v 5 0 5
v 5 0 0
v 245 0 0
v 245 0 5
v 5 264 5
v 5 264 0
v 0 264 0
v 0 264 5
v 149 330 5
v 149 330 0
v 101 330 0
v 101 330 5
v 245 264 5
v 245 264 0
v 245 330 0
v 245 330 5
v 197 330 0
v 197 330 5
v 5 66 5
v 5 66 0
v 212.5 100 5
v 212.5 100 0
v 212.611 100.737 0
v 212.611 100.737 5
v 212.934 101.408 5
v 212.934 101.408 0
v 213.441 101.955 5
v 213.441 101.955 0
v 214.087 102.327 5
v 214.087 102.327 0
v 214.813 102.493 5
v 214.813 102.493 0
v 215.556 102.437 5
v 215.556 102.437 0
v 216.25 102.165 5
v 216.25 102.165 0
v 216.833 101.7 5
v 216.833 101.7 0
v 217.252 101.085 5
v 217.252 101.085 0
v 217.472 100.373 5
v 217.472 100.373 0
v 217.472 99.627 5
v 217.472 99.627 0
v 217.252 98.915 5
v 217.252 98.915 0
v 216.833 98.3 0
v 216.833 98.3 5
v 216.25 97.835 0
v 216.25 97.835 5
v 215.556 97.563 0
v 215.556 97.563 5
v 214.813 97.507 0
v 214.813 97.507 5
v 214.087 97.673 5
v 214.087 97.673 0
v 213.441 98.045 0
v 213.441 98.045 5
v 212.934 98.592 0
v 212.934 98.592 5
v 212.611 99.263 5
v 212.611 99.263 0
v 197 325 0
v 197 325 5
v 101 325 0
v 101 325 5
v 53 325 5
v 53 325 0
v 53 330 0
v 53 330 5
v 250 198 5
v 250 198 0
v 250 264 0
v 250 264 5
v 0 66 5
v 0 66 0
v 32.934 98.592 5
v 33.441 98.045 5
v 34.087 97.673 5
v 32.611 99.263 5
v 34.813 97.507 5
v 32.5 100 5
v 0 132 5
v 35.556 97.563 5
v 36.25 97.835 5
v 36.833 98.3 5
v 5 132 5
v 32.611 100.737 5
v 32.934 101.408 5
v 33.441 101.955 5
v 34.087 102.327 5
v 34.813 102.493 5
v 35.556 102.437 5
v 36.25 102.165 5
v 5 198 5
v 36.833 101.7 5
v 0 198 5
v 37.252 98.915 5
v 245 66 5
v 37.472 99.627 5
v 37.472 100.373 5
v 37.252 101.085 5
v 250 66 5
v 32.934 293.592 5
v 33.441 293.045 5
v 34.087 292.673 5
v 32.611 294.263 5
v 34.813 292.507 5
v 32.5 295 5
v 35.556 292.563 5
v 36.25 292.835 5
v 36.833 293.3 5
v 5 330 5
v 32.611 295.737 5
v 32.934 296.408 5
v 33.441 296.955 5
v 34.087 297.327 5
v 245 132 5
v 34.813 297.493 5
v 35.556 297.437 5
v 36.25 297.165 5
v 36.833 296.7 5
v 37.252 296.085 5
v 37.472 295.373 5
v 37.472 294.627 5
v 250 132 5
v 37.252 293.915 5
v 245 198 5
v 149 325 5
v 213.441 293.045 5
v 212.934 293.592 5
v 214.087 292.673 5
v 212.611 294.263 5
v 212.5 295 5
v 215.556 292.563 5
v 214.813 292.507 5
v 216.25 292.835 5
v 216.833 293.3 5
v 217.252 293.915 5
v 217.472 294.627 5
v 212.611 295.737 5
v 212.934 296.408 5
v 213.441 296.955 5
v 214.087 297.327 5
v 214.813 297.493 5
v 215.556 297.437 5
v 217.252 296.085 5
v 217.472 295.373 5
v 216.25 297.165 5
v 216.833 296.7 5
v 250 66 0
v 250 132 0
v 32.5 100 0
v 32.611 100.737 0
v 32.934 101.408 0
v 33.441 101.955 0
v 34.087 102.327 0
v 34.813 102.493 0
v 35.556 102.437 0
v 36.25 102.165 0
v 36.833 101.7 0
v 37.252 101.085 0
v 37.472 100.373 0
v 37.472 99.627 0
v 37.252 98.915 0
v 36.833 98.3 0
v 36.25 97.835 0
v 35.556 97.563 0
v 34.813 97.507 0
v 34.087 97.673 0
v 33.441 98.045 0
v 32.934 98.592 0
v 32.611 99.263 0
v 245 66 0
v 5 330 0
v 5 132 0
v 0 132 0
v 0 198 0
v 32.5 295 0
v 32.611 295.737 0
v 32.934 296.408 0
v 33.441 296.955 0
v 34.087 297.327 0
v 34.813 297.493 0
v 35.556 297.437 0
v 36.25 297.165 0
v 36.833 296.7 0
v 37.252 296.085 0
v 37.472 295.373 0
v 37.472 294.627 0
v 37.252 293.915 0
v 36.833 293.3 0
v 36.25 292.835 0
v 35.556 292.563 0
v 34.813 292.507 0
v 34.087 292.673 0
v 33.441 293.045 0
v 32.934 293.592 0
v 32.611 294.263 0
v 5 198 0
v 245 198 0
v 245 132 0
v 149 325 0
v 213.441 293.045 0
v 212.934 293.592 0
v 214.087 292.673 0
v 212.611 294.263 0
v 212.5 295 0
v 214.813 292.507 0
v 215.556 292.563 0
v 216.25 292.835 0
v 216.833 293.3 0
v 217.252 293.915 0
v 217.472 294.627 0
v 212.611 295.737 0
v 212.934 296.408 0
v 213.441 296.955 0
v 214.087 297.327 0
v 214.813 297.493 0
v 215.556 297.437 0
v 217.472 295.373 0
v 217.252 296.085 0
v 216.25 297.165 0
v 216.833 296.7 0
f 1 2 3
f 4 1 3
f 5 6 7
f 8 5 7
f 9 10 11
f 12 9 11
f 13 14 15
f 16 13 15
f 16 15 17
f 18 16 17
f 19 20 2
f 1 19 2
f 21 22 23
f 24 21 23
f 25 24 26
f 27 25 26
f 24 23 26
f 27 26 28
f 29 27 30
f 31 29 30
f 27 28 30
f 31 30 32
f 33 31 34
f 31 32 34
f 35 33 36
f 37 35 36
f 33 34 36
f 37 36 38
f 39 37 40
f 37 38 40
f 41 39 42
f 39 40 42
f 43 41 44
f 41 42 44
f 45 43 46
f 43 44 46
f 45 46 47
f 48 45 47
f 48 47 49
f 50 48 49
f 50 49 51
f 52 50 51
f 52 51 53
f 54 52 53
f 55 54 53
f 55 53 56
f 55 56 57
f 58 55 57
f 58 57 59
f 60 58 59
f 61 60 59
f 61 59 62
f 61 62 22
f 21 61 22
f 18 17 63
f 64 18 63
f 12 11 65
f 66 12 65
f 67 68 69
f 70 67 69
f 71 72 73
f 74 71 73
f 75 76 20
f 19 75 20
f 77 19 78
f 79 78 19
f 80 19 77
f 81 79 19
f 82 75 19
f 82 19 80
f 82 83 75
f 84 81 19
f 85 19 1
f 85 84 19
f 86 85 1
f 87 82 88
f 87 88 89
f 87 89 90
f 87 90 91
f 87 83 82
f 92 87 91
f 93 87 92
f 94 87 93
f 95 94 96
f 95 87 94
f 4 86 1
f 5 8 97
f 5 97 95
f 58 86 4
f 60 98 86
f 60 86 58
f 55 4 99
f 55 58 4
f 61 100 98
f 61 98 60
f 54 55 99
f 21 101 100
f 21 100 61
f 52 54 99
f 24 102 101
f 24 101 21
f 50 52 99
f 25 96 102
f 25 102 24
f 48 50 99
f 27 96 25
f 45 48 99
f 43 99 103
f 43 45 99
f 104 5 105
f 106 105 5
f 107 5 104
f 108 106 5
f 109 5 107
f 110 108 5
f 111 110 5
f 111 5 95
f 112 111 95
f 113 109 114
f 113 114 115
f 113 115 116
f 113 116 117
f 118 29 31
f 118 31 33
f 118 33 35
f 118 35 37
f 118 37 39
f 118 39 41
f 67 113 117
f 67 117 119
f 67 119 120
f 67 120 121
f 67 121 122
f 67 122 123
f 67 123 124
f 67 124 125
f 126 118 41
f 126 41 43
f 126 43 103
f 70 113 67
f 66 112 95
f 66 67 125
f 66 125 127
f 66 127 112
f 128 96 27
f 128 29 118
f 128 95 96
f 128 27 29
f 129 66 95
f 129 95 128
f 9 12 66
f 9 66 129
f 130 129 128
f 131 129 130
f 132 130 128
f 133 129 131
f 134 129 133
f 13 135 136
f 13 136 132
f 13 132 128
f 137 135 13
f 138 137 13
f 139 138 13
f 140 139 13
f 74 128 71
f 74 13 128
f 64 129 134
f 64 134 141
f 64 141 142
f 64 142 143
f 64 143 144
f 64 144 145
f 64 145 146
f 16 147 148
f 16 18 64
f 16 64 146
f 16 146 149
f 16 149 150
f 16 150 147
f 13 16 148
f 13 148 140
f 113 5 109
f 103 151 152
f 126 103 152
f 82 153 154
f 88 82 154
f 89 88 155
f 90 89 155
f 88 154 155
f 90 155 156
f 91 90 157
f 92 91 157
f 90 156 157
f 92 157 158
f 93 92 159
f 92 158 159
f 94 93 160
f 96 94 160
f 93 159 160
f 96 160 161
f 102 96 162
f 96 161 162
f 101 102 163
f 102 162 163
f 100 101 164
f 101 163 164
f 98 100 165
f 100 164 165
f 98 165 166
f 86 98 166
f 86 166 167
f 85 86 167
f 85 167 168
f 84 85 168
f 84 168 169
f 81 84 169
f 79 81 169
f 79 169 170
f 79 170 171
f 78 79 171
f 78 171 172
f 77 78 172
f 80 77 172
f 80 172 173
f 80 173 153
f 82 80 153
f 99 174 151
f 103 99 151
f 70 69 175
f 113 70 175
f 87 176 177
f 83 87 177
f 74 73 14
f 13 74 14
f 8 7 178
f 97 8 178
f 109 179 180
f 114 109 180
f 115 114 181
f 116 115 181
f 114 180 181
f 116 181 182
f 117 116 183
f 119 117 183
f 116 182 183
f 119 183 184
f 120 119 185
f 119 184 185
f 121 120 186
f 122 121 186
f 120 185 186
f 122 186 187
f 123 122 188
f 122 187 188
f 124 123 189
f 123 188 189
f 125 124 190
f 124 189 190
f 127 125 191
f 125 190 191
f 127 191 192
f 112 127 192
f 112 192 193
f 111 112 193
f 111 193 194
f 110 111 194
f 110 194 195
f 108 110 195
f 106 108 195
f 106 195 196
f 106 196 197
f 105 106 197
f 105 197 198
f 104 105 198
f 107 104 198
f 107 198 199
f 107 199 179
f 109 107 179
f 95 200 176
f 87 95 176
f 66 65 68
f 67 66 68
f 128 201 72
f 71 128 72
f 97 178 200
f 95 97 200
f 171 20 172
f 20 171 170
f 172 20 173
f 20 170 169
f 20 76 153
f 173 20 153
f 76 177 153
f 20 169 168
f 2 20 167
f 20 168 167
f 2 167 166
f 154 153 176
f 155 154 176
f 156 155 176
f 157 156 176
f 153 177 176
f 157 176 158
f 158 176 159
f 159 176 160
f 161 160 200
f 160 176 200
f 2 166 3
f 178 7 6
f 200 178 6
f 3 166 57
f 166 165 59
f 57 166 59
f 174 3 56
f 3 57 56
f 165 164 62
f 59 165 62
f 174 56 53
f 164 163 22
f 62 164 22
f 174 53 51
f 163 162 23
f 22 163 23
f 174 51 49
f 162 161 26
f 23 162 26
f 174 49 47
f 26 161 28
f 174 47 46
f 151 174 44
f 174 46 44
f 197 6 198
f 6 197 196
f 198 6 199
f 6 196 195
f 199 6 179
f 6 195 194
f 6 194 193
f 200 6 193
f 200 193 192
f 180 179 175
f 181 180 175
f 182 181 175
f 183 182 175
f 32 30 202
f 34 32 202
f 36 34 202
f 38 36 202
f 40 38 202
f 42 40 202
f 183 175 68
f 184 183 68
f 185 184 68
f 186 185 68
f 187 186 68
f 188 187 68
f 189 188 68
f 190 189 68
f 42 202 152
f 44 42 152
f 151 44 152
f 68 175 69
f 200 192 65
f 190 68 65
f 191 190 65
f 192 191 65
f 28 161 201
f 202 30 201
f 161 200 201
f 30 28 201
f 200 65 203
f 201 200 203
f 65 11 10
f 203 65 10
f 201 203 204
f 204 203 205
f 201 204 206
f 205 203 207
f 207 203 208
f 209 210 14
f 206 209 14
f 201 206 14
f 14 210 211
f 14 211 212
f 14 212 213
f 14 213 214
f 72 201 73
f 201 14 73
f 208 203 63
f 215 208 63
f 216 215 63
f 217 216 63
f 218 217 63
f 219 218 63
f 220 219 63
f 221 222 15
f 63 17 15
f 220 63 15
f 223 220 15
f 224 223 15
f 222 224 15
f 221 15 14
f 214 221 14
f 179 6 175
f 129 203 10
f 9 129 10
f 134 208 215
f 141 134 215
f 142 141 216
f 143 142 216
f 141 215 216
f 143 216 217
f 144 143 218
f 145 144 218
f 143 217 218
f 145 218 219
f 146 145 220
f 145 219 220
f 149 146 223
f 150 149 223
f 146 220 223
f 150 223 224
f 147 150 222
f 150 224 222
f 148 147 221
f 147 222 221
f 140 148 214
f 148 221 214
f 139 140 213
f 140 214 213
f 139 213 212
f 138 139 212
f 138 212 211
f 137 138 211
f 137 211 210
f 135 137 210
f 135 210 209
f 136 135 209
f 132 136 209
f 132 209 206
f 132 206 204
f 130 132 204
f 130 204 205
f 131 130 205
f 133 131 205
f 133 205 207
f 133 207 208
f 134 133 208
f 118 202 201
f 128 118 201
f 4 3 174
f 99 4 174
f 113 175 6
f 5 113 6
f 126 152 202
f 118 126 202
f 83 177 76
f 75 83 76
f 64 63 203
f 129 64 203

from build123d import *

# Parameters (mm, degrees)
BOSS_EXTRU_1_DEPTH                = 5
DIAM_TRE_DU_PER_AGE_5_0_5_1_D     = 5
DIAM_TRE_DU_PER_AGE_5_0_5_1_DEPTH = 5


with BuildPart() as part:
    # Esquisse1 → Boss.-Extru.1 (new body)
    with BuildSketch(Plane.XY):
        Polygon((0, 66), (5, 66), (5, 0), (245, 0), (245, 66), (250, 66), (250, 132), (245, 132), (245, 198), (250, 198), (250, 264), (245, 264), (245, 330), (197, 330), (197, 325), (149, 325), (149, 330), (101, 330), (101, 325), (53, 325), (53, 330), (5, 330), (5, 264), (0, 264), (0, 198), (5, 198), (5, 132), (0, 132), align=None)
    extrude(amount=BOSS_EXTRU_1_DEPTH)

    # Diamètre du perçage Ø5.0 (5)1
    with Locations(Plane.XY.offset(5)):
        with Locations((35, 295), (215, 295), (215, 100), (35, 100)):
            Hole(DIAM_TRE_DU_PER_AGE_5_0_5_1_D / 2, depth=DIAM_TRE_DU_PER_AGE_5_0_5_1_DEPTH)


solid = part.part
